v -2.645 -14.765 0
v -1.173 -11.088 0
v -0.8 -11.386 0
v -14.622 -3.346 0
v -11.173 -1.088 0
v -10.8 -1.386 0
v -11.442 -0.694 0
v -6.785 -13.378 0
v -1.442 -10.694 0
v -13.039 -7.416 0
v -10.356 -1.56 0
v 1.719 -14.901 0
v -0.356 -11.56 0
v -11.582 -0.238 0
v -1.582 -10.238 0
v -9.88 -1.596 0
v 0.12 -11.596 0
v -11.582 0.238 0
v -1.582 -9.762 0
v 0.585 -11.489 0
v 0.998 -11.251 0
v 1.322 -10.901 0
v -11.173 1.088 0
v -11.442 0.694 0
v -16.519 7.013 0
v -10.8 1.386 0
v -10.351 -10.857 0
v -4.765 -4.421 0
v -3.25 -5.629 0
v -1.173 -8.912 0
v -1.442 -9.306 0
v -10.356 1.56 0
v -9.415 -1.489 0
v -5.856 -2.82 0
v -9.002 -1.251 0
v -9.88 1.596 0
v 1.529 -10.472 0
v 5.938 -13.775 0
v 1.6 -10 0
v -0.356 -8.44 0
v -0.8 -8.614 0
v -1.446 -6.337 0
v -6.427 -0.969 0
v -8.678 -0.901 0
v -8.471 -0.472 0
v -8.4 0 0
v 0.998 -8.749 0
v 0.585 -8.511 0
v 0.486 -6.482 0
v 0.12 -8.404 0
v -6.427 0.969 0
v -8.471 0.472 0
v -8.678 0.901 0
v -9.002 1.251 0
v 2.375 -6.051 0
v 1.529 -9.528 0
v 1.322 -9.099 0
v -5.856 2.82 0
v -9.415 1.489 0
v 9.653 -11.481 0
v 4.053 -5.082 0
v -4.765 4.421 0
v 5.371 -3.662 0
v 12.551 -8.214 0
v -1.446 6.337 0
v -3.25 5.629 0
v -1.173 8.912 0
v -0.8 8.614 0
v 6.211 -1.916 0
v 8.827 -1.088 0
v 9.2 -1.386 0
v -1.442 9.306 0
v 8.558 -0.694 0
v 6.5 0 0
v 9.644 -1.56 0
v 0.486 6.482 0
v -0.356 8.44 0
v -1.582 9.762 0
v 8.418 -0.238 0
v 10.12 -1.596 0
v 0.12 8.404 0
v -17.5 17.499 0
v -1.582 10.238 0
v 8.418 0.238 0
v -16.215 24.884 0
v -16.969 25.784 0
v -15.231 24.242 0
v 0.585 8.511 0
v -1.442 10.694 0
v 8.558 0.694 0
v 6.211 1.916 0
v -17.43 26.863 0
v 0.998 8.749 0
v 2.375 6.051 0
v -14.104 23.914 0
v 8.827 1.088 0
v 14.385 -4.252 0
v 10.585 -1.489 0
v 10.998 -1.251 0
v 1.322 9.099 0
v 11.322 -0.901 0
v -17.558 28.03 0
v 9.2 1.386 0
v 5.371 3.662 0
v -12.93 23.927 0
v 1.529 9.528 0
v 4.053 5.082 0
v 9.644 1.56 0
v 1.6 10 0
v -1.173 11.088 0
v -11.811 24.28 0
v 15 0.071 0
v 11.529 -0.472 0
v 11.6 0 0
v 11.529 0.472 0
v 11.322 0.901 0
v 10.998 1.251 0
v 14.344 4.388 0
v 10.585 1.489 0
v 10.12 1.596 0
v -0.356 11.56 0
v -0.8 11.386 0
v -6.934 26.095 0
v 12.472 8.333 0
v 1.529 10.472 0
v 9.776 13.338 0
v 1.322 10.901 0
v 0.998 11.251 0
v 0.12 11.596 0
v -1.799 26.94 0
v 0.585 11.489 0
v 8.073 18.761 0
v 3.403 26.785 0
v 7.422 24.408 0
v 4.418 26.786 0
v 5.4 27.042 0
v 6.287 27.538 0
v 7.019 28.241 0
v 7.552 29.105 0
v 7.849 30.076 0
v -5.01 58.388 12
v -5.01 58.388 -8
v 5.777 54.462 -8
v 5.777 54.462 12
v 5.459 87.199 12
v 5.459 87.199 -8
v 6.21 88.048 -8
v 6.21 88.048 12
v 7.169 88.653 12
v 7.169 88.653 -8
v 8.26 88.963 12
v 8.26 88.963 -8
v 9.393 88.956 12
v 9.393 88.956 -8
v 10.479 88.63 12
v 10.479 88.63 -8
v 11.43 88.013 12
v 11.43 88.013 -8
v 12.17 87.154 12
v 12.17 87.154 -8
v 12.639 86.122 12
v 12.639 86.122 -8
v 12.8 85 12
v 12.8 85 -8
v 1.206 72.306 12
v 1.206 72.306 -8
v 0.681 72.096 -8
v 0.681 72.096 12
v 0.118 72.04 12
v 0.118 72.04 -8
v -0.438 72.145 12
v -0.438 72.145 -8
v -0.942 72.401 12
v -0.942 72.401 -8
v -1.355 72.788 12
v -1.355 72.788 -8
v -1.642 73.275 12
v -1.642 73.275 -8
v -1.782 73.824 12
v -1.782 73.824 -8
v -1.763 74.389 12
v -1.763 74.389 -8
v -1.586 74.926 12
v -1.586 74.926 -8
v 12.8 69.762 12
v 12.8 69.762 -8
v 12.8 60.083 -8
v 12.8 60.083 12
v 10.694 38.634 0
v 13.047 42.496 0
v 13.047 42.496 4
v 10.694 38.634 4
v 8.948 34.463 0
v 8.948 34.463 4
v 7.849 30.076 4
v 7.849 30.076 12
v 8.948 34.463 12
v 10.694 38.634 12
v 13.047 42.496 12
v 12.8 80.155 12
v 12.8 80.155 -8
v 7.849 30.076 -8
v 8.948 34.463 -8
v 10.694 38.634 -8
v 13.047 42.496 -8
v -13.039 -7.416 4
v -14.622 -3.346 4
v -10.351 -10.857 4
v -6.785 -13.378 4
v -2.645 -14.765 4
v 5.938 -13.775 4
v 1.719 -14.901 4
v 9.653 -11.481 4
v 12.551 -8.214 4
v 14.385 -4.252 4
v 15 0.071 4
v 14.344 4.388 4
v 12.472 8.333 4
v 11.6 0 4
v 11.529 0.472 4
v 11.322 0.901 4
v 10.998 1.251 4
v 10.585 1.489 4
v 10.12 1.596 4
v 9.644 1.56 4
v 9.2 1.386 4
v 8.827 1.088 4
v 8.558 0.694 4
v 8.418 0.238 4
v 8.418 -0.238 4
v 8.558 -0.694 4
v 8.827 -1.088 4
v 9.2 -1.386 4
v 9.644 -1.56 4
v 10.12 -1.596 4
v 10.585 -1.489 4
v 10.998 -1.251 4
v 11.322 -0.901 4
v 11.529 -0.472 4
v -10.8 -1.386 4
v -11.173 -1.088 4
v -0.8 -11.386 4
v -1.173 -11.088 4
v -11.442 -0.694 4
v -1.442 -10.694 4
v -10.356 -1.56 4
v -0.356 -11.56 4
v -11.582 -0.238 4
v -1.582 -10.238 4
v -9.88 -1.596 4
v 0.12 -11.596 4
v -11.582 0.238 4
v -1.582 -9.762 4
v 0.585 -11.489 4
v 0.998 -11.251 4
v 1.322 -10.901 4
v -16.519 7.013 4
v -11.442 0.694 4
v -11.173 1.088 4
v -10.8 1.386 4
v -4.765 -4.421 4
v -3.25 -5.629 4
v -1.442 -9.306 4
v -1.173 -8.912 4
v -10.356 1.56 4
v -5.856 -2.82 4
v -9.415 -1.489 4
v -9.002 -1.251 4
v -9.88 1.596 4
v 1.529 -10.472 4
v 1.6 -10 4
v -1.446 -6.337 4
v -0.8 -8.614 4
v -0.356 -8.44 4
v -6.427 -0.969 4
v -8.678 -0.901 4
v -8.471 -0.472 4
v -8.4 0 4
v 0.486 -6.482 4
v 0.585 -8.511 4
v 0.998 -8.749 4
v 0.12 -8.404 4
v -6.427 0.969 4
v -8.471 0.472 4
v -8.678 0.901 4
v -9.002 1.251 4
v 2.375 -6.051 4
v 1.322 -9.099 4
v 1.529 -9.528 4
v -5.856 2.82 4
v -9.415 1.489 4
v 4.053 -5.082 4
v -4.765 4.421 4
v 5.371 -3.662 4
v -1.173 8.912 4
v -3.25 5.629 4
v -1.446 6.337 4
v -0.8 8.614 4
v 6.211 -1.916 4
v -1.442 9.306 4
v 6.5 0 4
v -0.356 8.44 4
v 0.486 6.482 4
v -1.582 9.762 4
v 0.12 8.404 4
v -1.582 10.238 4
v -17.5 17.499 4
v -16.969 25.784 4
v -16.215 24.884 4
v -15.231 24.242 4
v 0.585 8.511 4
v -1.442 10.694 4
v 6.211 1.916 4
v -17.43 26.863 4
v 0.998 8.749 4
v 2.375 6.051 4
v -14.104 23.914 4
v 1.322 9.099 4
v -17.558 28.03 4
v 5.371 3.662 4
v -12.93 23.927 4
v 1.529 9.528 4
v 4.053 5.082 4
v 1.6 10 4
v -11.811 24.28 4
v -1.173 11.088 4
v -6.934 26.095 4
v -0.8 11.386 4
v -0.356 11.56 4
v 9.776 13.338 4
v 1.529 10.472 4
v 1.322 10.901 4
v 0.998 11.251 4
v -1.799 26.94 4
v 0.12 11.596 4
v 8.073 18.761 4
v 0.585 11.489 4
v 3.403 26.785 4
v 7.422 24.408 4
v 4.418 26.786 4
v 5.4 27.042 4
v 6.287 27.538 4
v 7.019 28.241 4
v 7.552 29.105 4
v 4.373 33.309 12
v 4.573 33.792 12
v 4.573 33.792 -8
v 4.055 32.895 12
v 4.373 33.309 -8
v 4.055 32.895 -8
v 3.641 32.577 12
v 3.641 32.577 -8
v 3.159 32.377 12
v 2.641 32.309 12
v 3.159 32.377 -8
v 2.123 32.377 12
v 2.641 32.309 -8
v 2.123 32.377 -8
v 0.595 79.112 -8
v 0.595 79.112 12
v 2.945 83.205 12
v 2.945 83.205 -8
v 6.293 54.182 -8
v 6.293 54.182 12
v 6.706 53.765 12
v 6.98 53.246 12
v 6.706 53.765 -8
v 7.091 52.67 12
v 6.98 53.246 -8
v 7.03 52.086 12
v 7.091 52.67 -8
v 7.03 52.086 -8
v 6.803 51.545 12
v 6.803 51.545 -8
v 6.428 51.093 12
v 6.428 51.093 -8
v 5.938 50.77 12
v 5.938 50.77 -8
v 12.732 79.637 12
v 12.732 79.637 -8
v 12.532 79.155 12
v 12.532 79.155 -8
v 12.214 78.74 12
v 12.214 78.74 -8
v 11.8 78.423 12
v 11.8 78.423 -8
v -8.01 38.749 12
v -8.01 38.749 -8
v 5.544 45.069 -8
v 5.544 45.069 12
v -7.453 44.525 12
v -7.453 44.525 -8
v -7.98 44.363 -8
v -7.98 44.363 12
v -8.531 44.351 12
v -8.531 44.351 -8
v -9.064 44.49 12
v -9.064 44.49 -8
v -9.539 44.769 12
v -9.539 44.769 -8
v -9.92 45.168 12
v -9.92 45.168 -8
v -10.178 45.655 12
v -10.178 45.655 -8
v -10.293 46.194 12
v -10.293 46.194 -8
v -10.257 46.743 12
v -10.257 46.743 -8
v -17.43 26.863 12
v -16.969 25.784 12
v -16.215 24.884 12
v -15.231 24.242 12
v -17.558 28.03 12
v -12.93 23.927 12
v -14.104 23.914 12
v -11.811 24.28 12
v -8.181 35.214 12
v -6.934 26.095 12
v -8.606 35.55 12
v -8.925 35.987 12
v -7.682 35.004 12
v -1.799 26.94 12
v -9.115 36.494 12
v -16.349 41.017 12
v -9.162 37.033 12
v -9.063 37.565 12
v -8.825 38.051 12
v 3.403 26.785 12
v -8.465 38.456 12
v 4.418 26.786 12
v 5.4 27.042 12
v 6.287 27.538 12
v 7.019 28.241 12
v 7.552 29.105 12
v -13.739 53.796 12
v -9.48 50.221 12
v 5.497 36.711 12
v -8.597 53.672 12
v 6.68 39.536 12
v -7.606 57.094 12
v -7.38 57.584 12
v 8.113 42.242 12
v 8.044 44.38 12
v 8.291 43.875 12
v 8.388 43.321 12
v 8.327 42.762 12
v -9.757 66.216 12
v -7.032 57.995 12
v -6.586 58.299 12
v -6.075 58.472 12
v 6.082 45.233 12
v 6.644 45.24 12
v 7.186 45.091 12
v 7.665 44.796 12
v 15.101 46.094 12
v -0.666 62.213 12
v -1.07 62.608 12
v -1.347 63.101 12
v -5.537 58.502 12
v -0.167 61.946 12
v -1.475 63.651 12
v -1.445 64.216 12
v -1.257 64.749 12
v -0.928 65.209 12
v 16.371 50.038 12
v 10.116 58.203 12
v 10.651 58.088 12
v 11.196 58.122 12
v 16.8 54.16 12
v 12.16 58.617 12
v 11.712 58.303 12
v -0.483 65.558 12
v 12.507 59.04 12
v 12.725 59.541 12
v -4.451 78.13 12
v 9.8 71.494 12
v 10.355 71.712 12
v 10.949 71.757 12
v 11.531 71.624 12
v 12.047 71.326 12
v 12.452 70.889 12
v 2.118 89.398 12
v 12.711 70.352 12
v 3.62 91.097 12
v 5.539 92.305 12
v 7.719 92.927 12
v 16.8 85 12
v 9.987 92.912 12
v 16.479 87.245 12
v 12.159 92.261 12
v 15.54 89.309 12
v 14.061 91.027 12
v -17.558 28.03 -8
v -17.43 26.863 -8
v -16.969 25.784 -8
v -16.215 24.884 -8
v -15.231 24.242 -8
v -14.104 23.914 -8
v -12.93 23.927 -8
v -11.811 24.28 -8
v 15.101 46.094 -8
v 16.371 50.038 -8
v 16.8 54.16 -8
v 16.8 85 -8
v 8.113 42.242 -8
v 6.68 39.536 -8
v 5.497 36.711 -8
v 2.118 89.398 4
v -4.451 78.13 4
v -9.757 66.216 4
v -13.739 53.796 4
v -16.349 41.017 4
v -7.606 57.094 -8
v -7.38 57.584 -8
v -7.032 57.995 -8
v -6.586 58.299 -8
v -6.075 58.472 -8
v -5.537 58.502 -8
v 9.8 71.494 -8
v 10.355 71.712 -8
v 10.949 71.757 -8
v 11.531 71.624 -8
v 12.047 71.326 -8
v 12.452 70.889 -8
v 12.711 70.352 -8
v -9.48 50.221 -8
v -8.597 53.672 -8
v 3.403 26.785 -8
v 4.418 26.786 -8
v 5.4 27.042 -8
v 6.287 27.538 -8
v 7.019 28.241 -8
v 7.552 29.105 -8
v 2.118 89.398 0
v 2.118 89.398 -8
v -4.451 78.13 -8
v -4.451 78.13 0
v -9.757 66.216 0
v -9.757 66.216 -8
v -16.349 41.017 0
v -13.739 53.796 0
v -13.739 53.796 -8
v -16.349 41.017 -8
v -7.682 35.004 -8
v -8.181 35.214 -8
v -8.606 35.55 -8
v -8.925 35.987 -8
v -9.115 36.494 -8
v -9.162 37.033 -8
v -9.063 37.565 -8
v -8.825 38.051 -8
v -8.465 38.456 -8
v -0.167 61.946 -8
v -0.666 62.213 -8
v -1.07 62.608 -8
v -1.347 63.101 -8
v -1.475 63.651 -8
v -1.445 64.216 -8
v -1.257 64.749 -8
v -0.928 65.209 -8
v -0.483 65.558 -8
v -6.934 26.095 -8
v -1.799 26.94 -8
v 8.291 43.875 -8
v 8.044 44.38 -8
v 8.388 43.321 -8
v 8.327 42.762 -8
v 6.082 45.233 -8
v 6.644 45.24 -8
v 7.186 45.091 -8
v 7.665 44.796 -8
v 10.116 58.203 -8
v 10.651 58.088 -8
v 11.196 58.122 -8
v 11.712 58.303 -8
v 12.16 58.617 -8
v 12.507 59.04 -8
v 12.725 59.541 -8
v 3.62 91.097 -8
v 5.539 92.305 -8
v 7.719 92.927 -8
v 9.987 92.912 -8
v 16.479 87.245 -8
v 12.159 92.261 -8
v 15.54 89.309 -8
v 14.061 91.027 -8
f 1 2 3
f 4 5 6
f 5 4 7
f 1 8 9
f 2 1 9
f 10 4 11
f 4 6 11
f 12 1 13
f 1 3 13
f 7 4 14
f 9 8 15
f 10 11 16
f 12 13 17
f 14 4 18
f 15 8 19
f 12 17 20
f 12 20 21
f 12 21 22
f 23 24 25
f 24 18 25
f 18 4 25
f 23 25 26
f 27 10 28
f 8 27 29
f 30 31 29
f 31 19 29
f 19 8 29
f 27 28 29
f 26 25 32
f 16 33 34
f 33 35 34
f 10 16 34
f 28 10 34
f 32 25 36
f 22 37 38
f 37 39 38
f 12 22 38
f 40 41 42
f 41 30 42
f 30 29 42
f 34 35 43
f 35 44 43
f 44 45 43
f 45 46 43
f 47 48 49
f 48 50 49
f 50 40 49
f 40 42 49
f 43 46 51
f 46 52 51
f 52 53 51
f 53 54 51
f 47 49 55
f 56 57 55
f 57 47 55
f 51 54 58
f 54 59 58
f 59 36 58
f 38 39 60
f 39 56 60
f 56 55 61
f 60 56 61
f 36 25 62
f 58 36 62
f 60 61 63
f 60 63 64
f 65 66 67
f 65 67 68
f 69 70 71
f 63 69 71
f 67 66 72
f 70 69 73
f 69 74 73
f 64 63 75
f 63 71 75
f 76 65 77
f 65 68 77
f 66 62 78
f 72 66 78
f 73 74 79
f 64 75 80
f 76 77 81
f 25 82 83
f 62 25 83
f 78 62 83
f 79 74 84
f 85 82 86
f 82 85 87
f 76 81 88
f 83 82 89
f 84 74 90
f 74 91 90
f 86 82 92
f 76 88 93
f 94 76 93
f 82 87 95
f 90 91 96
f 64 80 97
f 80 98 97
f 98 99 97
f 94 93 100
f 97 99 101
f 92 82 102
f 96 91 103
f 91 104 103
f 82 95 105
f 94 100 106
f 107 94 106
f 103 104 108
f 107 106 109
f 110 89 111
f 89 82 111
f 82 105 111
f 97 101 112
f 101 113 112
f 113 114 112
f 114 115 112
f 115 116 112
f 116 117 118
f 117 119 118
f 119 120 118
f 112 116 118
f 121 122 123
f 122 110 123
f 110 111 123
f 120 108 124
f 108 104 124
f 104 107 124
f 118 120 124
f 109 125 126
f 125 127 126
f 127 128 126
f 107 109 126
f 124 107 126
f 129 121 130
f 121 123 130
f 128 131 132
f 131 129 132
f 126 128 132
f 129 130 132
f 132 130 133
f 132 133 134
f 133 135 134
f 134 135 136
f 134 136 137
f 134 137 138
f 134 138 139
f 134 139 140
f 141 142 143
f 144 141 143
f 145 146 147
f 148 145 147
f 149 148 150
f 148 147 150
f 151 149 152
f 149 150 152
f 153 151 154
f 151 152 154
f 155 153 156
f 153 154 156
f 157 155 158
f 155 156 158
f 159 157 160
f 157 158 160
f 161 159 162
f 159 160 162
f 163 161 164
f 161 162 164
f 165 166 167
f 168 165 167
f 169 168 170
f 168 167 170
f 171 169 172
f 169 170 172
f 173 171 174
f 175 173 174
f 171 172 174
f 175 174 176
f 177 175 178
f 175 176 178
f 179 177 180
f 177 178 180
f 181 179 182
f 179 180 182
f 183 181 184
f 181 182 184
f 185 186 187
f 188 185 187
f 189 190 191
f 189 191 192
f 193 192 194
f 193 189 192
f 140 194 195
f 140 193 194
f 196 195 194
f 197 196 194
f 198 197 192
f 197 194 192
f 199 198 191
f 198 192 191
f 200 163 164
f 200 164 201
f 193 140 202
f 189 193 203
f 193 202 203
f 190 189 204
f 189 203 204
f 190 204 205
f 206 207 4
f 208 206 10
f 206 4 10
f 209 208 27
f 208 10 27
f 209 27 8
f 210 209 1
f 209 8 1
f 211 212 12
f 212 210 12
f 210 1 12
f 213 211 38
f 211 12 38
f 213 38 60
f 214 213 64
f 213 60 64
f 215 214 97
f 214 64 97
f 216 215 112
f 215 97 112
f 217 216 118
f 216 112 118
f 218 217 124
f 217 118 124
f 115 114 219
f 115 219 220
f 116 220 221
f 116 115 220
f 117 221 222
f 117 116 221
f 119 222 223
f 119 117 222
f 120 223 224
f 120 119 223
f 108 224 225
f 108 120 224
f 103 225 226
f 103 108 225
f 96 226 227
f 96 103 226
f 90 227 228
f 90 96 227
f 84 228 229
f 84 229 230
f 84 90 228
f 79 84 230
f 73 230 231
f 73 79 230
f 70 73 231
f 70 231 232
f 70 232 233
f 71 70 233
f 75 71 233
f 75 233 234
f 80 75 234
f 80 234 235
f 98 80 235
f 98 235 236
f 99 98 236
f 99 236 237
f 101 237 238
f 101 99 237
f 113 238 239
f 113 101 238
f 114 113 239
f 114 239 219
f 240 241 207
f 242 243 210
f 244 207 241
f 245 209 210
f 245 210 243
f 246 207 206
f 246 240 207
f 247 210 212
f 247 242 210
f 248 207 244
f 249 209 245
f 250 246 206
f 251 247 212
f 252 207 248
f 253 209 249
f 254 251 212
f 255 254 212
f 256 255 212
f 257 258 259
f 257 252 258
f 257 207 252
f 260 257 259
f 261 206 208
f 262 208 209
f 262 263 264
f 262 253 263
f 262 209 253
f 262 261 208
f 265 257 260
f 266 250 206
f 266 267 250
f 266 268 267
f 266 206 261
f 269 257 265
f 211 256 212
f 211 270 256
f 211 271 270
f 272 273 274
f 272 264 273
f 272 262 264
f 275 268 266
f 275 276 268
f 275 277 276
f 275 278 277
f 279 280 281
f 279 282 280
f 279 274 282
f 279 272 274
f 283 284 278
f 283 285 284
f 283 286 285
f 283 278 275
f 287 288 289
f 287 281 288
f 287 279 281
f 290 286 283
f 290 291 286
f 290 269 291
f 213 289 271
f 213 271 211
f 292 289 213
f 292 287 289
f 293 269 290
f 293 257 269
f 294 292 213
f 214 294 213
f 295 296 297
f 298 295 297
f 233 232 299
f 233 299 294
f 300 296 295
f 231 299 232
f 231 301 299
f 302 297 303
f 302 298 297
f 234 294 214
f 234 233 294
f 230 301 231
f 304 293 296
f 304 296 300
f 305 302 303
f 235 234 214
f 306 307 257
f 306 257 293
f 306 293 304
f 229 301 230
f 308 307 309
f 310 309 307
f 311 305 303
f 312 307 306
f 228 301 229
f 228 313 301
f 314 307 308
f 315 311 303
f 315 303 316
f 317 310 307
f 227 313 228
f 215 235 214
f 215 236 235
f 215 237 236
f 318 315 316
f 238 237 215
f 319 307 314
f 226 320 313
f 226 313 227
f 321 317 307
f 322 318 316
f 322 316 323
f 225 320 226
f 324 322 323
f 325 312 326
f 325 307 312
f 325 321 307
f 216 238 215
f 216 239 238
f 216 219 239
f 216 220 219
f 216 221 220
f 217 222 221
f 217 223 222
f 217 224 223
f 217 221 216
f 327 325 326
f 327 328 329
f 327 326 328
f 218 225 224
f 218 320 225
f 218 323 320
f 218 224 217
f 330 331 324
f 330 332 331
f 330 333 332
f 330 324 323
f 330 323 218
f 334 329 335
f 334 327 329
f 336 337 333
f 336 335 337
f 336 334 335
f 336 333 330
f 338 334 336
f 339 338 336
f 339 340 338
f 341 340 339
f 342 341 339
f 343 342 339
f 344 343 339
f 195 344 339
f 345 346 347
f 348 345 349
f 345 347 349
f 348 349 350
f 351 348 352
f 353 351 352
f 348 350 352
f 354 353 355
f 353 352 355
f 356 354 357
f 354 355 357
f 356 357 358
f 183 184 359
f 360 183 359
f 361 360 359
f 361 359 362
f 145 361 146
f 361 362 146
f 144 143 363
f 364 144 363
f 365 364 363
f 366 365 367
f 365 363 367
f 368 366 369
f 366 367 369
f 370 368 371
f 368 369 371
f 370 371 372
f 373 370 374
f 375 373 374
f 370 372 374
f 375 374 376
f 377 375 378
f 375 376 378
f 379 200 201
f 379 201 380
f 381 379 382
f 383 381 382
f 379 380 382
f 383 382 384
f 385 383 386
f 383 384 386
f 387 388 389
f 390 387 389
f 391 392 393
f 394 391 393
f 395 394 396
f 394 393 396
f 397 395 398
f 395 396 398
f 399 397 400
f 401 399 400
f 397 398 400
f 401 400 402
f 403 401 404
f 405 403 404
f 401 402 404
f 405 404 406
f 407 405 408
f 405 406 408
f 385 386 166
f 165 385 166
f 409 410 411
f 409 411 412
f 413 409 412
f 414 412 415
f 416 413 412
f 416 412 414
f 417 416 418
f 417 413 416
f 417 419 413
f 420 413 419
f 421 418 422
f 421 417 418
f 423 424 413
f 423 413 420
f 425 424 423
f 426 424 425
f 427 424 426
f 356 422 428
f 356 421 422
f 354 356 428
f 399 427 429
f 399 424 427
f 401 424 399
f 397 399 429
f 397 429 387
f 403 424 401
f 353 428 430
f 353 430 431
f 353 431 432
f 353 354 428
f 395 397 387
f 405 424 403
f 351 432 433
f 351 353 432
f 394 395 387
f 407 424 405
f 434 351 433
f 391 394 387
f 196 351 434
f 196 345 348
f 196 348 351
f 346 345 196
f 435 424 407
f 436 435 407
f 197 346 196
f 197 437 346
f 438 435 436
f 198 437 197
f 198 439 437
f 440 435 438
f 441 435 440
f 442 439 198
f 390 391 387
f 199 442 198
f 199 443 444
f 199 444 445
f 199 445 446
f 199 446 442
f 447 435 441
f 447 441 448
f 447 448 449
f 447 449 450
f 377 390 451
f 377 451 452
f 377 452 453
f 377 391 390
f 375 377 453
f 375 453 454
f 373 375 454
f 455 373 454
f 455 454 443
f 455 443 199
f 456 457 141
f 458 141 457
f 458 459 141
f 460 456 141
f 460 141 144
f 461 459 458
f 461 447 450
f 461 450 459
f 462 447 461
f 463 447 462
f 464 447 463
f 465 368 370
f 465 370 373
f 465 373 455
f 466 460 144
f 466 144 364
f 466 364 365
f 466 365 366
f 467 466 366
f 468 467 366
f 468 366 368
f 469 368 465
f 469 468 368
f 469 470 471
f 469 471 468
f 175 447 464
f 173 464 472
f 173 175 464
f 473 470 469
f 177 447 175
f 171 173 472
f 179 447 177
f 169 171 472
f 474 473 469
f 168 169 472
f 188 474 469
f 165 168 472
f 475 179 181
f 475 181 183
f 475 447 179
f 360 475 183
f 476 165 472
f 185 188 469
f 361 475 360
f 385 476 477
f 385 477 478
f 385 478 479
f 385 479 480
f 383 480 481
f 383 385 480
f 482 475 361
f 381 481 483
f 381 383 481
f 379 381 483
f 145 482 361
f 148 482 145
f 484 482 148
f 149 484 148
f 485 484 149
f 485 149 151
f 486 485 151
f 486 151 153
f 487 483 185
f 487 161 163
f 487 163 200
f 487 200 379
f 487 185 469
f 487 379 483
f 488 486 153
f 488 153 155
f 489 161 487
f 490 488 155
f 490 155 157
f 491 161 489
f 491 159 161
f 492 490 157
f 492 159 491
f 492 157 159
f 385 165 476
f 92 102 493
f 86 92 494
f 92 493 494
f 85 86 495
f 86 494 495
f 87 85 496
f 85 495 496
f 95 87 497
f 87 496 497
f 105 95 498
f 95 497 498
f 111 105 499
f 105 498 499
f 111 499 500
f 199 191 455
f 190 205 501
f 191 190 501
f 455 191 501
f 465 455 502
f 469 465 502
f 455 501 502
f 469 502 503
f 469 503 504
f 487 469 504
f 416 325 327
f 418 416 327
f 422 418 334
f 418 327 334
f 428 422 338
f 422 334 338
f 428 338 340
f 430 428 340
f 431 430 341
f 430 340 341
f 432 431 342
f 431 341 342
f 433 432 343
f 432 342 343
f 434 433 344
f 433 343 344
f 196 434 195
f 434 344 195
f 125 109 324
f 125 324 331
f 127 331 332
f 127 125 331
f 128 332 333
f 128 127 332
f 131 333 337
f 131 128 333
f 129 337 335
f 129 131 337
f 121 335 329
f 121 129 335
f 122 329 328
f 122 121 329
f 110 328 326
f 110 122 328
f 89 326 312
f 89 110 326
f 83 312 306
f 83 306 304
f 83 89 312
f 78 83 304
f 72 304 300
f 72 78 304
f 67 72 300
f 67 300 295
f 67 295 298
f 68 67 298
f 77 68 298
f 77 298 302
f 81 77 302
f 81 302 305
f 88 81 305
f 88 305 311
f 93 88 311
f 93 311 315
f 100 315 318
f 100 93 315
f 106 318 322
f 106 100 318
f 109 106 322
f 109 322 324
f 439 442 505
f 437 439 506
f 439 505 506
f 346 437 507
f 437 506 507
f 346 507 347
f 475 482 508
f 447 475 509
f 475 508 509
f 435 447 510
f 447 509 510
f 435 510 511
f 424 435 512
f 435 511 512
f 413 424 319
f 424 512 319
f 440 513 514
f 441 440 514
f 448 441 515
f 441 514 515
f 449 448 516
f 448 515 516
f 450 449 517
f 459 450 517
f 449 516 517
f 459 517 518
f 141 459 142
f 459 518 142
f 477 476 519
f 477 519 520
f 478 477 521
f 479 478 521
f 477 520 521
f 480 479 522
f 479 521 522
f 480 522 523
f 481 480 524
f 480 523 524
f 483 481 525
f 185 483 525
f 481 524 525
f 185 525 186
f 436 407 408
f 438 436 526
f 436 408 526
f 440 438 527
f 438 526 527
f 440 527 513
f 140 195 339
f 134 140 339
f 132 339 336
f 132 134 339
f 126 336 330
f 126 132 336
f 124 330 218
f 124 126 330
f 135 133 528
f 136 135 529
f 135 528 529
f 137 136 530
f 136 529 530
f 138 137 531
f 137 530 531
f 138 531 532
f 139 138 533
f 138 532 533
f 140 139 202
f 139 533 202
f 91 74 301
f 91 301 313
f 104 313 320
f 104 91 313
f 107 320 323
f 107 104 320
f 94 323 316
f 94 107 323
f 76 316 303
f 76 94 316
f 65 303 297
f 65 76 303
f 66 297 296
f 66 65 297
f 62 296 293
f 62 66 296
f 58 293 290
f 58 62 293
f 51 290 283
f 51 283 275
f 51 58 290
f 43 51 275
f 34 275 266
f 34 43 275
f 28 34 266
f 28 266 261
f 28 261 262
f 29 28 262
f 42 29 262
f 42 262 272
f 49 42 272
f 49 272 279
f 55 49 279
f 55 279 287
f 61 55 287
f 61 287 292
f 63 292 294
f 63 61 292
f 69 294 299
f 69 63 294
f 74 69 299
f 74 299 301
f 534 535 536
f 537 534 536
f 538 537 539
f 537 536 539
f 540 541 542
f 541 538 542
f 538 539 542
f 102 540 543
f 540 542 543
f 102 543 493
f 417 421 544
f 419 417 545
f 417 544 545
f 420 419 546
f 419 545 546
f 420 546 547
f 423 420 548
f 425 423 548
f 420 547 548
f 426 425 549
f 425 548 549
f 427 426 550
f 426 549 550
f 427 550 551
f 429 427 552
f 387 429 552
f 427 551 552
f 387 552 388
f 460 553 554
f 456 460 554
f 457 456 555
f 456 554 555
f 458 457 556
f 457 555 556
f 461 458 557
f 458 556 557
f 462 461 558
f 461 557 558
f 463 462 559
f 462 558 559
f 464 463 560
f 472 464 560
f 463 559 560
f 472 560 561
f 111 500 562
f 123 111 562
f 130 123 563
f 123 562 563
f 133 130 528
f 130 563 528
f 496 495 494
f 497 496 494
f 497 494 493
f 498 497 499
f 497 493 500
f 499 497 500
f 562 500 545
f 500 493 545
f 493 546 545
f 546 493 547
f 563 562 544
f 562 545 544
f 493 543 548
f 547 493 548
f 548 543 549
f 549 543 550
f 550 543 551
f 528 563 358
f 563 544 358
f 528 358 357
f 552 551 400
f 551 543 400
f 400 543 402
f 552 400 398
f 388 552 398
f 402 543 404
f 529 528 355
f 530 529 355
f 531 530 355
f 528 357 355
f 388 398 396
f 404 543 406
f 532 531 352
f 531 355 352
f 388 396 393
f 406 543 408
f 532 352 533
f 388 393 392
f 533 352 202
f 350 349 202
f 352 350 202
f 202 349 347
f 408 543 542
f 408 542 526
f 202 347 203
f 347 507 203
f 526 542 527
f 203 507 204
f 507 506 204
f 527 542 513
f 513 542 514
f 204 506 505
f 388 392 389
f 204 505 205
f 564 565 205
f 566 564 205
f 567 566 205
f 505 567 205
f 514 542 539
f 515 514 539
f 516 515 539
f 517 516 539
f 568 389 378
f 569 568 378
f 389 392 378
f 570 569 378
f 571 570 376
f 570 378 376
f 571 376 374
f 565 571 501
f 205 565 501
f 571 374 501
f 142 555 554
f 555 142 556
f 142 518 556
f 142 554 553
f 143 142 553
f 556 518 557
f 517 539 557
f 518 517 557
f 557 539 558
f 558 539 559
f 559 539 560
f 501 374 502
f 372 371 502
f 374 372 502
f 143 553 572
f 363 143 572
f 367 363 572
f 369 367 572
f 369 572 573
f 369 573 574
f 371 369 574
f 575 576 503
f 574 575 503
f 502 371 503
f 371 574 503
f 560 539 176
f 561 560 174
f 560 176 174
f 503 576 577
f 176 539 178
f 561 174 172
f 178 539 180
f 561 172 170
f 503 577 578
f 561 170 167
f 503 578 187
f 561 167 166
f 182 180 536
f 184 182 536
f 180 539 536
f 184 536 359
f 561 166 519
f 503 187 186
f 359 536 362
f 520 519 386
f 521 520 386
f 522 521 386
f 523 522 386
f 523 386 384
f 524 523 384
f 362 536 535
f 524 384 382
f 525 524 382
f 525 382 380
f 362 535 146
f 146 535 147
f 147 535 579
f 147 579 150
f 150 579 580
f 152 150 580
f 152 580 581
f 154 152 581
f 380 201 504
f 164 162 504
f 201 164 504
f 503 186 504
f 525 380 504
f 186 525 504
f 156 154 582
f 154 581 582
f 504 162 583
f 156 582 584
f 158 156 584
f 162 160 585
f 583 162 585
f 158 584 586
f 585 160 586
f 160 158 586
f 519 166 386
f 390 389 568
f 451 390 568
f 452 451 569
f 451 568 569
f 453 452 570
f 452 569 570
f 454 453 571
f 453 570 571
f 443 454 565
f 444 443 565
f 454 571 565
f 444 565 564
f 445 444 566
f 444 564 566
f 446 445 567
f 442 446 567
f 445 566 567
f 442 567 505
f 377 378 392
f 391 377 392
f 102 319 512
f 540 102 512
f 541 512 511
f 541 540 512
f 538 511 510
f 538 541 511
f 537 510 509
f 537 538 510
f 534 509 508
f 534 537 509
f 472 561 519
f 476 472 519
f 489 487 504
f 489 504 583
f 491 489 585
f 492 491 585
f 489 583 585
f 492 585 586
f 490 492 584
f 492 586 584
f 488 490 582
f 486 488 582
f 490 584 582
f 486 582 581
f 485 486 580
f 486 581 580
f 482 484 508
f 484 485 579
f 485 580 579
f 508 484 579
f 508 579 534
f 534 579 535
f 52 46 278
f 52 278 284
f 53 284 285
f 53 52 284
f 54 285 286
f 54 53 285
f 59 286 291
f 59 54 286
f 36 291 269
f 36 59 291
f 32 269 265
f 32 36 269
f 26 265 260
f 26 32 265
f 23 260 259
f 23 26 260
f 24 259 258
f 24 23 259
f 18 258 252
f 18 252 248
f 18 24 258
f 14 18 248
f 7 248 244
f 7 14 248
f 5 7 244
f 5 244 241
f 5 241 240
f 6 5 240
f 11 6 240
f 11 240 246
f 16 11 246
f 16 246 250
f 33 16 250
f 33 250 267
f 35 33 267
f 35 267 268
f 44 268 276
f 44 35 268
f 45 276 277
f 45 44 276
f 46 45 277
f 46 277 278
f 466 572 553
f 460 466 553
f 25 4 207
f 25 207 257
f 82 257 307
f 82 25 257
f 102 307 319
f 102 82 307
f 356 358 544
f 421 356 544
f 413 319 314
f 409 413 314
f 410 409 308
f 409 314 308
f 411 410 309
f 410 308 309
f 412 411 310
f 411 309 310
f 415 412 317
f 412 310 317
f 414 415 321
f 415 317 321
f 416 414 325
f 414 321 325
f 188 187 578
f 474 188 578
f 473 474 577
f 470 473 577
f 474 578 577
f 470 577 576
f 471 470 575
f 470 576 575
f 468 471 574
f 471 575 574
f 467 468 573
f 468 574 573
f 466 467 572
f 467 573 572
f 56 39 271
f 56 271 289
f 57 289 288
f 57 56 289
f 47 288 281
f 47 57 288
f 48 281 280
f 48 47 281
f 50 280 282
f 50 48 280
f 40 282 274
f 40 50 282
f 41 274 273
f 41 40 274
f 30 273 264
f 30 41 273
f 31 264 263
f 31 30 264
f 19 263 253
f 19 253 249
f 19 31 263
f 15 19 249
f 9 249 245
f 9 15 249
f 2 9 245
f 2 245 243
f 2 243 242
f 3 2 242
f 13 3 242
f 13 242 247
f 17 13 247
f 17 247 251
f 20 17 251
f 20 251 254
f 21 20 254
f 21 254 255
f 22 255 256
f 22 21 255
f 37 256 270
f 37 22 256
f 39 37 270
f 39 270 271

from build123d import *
from build123d.topology import SkipClean

# Parameters (mm, degrees)
SKETCH_1_R           = 15
SKETCH_1_R_2         = 6.5
SKETCH_1_R_3         = 1.6
EXTRUDE_1_DEPTH      = 4
EXTRUDE_START        = -4
EXTRUDE_3_DEPTH      = 4
EXTRUDE_4_DEPTH      = 8
EXTRUDE_4_DEPTH_BACK = 12
CUT_EXTRUDE_1_DEPTH  = 46


with BuildPart() as part:
    # 草图1 → 凸台-拉伸1 (new body)
    with BuildSketch(Plane.XY):
        Circle(SKETCH_1_R)
        Circle(SKETCH_1_R_2, mode=Mode.SUBTRACT)
        with Locations((0, 10)):
            Circle(SKETCH_1_R_3, mode=Mode.SUBTRACT)
        with Locations((10, 0)):
            Circle(SKETCH_1_R_3, mode=Mode.SUBTRACT)
        with Locations((0, -10)):
            Circle(SKETCH_1_R_3, mode=Mode.SUBTRACT)
        with Locations((-10, 0)):
            Circle(SKETCH_1_R_3, mode=Mode.SUBTRACT)
    extrude(amount=EXTRUDE_1_DEPTH)

    # 草图2 → 凸台-拉伸3 (add)
    with BuildSketch(Plane.XY.offset(4).offset(EXTRUDE_START)):
        with BuildLine():
            Line((16.8, 85), (16.8, 54.159799849))
            ThreePointArc((16.8, 54.159799849), (15.83854762, 48.033324147), (13.046629547, 42.49587991))
            ThreePointArc((13.046629547, 42.49587991), (7.420814059, 25.504374344), (12.472191289, 8.333333333))
            ThreePointArc((12.472191289, 8.333333333), (-5.937882388, 13.774670695), (-14.621995932, -3.346226976))
            ThreePointArc((-14.621995932, -3.346226976), (-15.737901413, 44.738127218), (2.117573463, 89.398315084))
            ThreePointArc((2.117573463, 89.398315084), (11.095712057, 92.663530919), (16.8, 85))
        make_face()
    extrude(amount=EXTRUDE_3_DEPTH)

    # 草图3 → 凸台-拉伸4 (add, two sides: drawn at the far end of the back side and taken through both)
    with SkipClean():  # the faces are left unmerged after this step: merging them gives an invalid solid
        with BuildSketch(Plane.XY.offset(4).offset(-EXTRUDE_4_DEPTH_BACK)):
            with BuildLine():
                Line((16.8, 54.159799849), (16.8, 85))
                ThreePointArc((16.8, 85), (11.095712057, 92.663530919), (2.117573463, 89.398315084))
                ThreePointArc((2.117573463, 89.398315084), (-11.916705707, 60.059804871), (-17.55757213, 28.030290369))
                ThreePointArc((-17.55757213, 28.030290369), (-15.746673, 24.526996644), (-11.810776072, 24.27973576))
                ThreePointArc((-11.810776072, 24.27973576), (-4.386649325, 26.64127076), (3.402697603, 26.784727906))
                ThreePointArc((3.402697603, 26.784727906), (6.286614818, 27.53779516), (7.849127177, 30.076031539))
                ThreePointArc((7.849127177, 30.076031539), (9.742150736, 36.581291134), (13.046629547, 42.49587991))
                ThreePointArc((13.046629547, 42.49587991), (15.83854762, 48.033324147), (16.8, 54.159799849))
            make_face()
        extrude(amount=EXTRUDE_4_DEPTH + EXTRUDE_4_DEPTH_BACK)
    add(part.part.scale(1), mode=Mode.REPLACE)  # the faces are merged on a copy

    # 草图5 → 切除-拉伸1 (cut)
    with BuildSketch(Plane(origin=(0, 0, -8), x_dir=(-1, 0, 0), z_dir=(0, 0, -1))):
        with BuildLine():
            Line((-12.8, 69.762395693), (-12.8, 60.082793322))
            ThreePointArc((-12.8, 60.082793322), (-11.947152873, 58.444489233), (-10.115959713, 58.20340808))
            Line((-10.115959713, 58.20340808), (0.167044148, 61.946115404))
            ThreePointArc((0.167044148, 61.946115404), (1.475393257, 63.65118916), (0.483003861, 65.557551453))
            Line((0.483003861, 65.557551453), (-9.8, 71.494446501))
            ThreePointArc((-9.8, 71.494446501), (-11.8, 71.494446501), (-12.8, 69.762395693))
        make_face()
        with BuildLine():
            Line((-11.8, 78.422649731), (-1.206357847, 72.306407582))
            ThreePointArc((-1.206357847, 72.306407582), (1.162211364, 72.580028303), (1.585705551, 74.926438557))
            ThreePointArc((1.585705551, 74.926438557), (-1.749223409, 81.170317372), (-5.458786731, 87.199157542))
            ThreePointArc((-5.458786731, 87.199157542), (-9.947856029, 88.83176546), (-12.8, 85))
            Line((-12.8, 85), (-12.8, 80.154700538))
            ThreePointArc((-12.8, 80.154700538), (-12.532050808, 79.154700538), (-11.8, 78.422649731))
        make_face()
        with BuildLine():
            Line((5.01005666, 58.38793894), (-5.776995128, 54.461773174))
            ThreePointArc((-5.776995128, 54.461773174), (-7.091051284, 52.669626708), (-5.938191364, 50.769772359))
            Line((-5.938191364, 50.769772359), (7.453099332, 44.525310955))
            ThreePointArc((7.453099332, 44.525310955), (9.539258698, 44.76945259), (10.256783773, 46.743490028))
            ThreePointArc((10.256783773, 46.743490028), (9.051891671, 51.949605837), (7.60645214, 57.094128298))
            ThreePointArc((7.60645214, 57.094128298), (6.586103601, 58.298616303), (5.01005666, 58.38793894))
        make_face()
        with BuildLine():
            Line((-2.123332063, 32.377143259), (7.681973135, 35.004466868))
            ThreePointArc((7.681973135, 35.004466868), (9.156724441, 36.762007035), (8.009571568, 38.748934095))
            Line((8.009571568, 38.748934095), (-5.543860738, 45.069003373))
            ThreePointArc((-5.543860738, 45.069003373), (-7.869208523, 44.601479118), (-8.112845962, 42.242144033))
            ThreePointArc((-8.112845962, 42.242144033), (-6.056960525, 38.136767143), (-4.572948137, 33.791828527))
            ThreePointArc((-4.572948137, 33.791828527), (-3.641181599, 32.577066199), (-2.123332063, 32.377143259))
        make_face()
    extrude(amount=-CUT_EXTRUDE_1_DEPTH, mode=Mode.SUBTRACT)


solid = part.part
